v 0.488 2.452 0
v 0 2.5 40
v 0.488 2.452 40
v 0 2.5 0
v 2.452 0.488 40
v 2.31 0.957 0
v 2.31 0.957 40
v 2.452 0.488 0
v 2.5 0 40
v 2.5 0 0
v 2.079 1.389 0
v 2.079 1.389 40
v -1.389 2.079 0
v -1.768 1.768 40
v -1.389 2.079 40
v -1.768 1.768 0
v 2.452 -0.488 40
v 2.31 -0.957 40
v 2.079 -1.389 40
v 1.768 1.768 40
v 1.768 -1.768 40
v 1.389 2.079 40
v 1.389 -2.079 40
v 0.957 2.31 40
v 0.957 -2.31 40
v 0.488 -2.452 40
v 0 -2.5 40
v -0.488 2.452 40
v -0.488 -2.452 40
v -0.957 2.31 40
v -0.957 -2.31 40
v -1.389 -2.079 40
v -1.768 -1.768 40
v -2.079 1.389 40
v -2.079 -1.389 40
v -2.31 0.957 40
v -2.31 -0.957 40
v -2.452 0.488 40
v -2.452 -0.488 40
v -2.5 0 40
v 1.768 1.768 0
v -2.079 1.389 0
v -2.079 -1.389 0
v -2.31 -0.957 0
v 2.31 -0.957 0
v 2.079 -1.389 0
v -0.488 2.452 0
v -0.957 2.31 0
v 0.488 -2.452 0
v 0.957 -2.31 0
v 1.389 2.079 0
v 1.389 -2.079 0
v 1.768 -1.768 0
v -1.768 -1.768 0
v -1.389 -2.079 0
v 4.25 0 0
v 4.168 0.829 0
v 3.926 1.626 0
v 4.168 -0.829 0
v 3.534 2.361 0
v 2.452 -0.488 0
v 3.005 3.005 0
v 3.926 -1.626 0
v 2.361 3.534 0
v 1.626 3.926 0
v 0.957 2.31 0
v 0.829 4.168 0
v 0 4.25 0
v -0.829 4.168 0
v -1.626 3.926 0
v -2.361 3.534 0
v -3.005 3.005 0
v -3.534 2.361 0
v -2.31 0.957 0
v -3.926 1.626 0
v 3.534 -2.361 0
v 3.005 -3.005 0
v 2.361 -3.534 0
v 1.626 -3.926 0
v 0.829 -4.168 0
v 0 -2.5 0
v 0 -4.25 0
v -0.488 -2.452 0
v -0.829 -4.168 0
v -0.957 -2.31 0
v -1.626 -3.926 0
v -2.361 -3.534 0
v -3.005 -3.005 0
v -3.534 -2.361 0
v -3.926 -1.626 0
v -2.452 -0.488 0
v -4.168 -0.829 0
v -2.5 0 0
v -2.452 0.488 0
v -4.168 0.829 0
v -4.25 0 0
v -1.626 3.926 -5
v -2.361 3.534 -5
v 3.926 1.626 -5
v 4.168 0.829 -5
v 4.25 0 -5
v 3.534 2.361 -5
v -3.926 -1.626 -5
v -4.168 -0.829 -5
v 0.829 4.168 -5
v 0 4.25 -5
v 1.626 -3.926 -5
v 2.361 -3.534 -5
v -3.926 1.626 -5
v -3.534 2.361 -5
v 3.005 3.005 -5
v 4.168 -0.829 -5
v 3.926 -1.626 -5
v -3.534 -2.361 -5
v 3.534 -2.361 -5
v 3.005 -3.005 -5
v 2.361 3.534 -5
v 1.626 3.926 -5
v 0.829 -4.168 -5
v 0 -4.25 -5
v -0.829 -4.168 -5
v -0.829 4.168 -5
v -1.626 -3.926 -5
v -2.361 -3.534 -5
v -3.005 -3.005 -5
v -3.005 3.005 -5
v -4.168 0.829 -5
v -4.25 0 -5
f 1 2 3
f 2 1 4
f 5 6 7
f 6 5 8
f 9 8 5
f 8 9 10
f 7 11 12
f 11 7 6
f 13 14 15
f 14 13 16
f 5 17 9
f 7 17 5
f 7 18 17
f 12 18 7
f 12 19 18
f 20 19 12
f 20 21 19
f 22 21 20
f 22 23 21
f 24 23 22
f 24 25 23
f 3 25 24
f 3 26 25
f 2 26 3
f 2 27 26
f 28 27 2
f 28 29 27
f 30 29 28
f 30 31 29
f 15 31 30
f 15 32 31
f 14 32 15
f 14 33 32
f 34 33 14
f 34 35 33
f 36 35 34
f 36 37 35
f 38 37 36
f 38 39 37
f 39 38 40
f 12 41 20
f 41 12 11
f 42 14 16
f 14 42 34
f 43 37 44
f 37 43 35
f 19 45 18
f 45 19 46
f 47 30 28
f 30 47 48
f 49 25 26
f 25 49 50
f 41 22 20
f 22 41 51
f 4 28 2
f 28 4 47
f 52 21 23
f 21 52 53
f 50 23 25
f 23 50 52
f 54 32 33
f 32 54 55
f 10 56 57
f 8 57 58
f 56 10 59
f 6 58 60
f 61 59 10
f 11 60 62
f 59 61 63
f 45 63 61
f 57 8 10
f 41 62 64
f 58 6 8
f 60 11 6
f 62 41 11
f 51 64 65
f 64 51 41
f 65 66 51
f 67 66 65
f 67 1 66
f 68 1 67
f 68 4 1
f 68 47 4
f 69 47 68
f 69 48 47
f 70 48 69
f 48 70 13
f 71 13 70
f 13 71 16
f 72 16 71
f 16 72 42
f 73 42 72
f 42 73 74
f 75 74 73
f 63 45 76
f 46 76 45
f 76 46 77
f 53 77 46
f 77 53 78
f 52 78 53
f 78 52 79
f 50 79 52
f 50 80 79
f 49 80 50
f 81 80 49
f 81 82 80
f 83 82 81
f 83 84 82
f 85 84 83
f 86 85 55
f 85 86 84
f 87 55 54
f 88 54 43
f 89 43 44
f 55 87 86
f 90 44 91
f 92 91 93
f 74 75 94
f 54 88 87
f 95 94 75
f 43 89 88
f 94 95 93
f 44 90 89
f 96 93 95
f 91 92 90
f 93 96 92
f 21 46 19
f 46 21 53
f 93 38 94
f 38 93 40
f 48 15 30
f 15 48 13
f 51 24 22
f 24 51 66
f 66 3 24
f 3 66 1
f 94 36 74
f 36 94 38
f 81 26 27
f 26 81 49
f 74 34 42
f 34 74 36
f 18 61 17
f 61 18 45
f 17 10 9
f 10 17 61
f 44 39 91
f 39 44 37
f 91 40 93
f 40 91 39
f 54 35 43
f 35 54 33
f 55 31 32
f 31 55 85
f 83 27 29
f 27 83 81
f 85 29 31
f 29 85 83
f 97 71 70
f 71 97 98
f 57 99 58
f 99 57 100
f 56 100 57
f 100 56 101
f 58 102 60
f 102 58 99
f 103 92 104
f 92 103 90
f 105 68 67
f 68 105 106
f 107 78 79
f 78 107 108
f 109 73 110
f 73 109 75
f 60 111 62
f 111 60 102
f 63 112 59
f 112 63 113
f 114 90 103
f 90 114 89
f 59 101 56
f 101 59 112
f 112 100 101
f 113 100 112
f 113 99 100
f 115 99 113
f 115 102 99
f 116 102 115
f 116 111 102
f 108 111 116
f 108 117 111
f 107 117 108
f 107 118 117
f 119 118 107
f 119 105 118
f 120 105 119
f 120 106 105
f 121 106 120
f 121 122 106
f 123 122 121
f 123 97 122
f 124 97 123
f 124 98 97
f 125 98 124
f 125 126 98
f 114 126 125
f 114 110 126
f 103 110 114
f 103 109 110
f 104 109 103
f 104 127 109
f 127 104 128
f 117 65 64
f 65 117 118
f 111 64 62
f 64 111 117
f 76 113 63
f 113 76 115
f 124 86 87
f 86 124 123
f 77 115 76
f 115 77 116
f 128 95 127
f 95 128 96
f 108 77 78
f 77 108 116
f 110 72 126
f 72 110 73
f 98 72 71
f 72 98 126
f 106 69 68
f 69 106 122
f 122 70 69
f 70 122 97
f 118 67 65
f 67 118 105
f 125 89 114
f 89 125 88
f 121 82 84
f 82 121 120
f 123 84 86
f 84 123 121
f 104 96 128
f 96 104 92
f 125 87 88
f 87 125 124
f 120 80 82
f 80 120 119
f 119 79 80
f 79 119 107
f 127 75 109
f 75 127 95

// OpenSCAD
// Purchased hardware envelope; no modeled threads, not print.
$fn=32;
union(){cylinder(d=5,h=40);translate([0,0,-5])cylinder(d=8.5,h=5);}
